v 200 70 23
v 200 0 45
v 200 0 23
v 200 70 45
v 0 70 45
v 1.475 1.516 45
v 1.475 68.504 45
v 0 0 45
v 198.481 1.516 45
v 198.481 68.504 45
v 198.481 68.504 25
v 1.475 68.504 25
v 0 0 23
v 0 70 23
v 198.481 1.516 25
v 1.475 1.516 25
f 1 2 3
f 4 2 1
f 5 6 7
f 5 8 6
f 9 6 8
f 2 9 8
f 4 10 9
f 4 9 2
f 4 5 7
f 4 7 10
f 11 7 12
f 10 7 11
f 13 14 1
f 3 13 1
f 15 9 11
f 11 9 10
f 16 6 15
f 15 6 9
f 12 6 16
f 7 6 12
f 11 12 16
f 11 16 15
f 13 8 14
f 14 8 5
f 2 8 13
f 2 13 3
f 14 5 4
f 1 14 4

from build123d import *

# Parameters (mm, degrees)
SKETCH_W     = 200
SKETCH_H     = 70
PAD_DEPTH    = 22
SKETCH001_W  = 197.00663
SKETCH001_H  = 66.988611
POCKET_DEPTH = 20


with BuildPart() as part:
    # Sketch (on Sketch) → Pad (new body)
    with BuildSketch(Plane.XY.offset(45)):
        with Locations((100, 35)):
            Rectangle(SKETCH_W, SKETCH_H)
    extrude(amount=-PAD_DEPTH)

    # Sketch001 (on Face6 of Pad) → Pocket (cut)
    with BuildSketch(Plane.XY.offset(45)):
        with Locations((99.977825, 35.009929)):
            Rectangle(SKETCH001_W, SKETCH001_H)
    extrude(amount=-POCKET_DEPTH, mode=Mode.SUBTRACT)


solid = part.part
